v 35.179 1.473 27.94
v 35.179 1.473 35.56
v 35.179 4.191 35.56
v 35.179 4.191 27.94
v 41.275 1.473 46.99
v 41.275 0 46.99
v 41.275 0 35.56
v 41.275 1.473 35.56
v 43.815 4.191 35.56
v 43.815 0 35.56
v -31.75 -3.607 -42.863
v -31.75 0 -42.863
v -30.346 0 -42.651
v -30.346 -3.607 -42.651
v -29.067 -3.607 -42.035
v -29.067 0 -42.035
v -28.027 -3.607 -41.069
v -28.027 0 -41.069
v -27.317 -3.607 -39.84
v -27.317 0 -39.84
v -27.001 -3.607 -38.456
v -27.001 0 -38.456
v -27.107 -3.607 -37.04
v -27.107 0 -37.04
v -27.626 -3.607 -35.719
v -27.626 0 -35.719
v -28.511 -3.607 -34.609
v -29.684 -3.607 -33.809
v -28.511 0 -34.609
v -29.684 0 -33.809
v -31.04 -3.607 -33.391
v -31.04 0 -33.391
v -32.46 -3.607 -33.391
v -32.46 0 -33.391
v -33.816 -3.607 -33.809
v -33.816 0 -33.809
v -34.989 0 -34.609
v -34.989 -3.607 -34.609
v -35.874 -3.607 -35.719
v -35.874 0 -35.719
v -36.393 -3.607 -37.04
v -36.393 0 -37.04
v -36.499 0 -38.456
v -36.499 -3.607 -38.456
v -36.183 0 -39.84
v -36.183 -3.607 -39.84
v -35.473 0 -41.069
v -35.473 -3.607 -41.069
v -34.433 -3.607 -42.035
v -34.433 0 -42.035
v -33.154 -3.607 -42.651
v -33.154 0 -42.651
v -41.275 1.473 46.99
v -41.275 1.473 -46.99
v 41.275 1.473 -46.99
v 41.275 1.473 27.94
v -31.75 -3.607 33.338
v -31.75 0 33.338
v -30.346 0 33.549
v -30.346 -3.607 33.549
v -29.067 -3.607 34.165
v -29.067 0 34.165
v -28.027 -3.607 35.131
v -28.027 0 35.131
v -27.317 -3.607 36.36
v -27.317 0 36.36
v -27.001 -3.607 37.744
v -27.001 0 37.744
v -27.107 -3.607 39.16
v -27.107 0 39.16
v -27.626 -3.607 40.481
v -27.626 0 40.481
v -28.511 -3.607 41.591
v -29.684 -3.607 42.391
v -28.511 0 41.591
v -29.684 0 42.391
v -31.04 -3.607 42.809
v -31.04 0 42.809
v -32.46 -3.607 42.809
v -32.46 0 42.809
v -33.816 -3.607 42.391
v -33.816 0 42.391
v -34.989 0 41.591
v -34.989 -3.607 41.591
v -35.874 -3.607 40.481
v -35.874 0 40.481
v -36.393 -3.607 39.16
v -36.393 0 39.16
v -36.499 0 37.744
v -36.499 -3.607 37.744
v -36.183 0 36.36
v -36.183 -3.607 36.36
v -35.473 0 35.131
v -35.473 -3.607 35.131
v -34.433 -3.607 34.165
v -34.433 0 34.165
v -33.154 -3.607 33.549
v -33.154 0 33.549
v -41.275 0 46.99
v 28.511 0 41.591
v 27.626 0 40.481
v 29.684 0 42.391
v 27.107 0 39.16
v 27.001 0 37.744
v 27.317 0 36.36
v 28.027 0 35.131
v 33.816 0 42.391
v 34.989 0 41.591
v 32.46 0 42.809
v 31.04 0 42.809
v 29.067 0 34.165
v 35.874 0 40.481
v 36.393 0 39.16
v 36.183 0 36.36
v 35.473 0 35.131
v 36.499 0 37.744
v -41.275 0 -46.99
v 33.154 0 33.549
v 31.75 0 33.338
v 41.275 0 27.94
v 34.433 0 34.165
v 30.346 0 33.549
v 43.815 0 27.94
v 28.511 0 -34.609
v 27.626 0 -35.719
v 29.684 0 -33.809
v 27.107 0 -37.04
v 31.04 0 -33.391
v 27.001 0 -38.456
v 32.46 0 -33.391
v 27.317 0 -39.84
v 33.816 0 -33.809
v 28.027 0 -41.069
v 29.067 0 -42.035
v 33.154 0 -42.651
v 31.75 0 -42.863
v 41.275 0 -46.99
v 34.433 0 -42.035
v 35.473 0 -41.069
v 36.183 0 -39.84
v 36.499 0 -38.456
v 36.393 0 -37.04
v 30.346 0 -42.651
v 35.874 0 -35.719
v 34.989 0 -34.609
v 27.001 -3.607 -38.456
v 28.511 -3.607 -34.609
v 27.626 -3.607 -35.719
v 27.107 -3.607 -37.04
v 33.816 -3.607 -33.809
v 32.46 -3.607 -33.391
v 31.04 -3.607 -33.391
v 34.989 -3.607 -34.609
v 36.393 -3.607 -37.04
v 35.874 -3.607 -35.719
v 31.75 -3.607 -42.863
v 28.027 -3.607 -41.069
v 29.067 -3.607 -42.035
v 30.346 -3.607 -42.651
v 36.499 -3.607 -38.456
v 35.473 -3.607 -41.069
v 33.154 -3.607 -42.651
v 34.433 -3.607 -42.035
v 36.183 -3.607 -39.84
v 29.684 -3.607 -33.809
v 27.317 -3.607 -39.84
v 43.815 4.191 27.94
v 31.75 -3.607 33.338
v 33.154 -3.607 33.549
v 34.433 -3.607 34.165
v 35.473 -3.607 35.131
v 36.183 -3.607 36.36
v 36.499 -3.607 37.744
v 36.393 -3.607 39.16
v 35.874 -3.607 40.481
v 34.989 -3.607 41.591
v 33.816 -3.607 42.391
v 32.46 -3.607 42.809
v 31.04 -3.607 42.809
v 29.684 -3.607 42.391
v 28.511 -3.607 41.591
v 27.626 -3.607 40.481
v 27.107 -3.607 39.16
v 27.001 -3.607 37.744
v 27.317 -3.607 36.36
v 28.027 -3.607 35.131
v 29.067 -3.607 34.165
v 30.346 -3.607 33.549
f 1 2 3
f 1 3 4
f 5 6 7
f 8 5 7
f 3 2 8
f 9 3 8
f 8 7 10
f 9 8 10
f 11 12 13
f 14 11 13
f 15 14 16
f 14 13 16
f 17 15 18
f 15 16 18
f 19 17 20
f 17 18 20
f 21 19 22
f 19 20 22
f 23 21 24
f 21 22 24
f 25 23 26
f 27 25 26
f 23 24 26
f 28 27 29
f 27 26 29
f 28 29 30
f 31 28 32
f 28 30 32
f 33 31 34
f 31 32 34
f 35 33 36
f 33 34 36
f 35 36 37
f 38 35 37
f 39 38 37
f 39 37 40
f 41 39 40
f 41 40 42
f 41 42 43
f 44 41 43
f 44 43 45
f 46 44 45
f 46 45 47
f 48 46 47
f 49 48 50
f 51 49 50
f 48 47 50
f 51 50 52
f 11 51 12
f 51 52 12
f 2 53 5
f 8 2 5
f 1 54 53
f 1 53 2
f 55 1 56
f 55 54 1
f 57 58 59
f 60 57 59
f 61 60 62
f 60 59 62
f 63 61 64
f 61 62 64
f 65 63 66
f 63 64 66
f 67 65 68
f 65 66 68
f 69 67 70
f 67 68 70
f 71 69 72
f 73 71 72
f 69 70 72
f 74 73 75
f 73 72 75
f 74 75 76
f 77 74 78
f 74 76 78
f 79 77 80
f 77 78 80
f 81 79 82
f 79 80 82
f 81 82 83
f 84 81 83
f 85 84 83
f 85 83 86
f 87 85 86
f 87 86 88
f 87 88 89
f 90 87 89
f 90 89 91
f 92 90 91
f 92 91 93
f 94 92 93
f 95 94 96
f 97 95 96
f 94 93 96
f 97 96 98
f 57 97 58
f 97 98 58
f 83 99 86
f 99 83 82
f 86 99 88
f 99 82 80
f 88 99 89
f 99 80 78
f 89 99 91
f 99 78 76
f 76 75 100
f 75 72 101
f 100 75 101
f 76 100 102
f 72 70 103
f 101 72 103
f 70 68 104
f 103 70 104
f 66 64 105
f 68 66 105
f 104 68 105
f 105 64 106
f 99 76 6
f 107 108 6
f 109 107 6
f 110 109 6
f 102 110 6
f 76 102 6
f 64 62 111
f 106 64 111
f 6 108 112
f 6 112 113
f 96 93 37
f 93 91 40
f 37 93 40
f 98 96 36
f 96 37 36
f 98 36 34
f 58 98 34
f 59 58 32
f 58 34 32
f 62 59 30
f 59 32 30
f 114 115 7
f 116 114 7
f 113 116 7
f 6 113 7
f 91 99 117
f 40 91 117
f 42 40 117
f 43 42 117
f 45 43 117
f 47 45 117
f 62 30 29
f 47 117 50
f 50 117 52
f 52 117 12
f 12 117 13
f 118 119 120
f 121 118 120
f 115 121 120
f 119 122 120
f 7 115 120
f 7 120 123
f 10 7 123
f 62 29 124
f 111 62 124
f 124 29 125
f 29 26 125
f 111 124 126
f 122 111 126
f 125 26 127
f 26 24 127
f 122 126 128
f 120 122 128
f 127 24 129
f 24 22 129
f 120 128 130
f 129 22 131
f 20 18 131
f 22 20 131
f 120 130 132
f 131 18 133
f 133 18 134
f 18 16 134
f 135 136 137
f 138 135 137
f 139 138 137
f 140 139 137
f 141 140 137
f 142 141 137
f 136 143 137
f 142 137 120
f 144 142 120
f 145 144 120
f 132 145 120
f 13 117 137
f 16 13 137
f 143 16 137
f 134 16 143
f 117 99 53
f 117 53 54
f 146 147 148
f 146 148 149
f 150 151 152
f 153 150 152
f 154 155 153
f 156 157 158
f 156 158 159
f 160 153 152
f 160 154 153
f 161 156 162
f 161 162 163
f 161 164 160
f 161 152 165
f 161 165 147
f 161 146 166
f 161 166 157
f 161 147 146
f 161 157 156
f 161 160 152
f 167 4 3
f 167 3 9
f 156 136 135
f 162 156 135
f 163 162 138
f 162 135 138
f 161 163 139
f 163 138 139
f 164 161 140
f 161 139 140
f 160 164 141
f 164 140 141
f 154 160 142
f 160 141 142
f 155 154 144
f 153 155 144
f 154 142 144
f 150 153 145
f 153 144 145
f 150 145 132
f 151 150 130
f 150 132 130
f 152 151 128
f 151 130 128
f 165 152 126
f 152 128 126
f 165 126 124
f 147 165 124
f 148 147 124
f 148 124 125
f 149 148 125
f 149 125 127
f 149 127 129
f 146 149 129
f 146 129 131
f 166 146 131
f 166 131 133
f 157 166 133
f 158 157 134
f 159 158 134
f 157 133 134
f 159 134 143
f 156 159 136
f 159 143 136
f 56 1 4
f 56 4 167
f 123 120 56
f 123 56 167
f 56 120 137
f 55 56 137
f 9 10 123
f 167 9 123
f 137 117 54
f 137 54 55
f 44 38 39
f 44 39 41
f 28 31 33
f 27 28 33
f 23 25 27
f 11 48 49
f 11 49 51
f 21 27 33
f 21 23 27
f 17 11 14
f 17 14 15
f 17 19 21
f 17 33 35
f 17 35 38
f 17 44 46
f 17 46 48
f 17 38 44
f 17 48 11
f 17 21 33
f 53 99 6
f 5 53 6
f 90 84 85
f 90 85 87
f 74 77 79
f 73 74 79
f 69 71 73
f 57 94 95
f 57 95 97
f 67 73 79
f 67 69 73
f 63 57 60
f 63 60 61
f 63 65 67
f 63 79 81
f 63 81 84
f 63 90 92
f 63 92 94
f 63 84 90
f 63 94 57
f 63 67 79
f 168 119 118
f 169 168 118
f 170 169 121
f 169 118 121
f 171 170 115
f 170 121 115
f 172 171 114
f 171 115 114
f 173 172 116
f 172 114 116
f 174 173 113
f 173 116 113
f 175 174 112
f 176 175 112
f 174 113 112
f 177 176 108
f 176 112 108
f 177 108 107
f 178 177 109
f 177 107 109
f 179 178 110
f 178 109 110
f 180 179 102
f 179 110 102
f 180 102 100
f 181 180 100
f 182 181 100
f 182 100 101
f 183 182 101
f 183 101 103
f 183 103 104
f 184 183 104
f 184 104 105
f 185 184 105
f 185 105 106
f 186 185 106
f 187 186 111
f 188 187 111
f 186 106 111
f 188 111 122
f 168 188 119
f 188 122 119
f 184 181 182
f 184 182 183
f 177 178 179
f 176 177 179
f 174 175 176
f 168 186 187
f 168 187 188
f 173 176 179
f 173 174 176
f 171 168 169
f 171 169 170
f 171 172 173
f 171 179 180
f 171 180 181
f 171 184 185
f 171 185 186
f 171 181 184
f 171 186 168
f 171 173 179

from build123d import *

# Parameters (mm, degrees)
SKETCH1_W           = 82.55
SKETCH1_H           = 93.98
BOSS_EXTRUDE1_DEPTH = 1.4732
SKETCH2_W           = 8.636
SKETCH2_H           = 7.62
BOSS_EXTRUDE2_DEPTH = 4.191
SKETCH3_R           = 4.7625
BOSS_EXTRUDE3_DEPTH = 3.6068


with BuildPart() as part:
    # Sketch1 → Boss-Extrude1 (new body)
    with BuildSketch(Plane(origin=(0, 0, 0), x_dir=(1, 0, 0), z_dir=(0, 1, 0))):
        Rectangle(SKETCH1_W, SKETCH1_H)
    extrude(amount=BOSS_EXTRUDE1_DEPTH)

    # Sketch2 → Boss-Extrude2 (add)
    with BuildSketch(Plane(origin=(0, 0, 0), x_dir=(1, 0, 0), z_dir=(0, 1, 0))):
        with Locations((39.497, -31.75)):
            Rectangle(SKETCH2_W, SKETCH2_H)
    extrude(amount=BOSS_EXTRUDE2_DEPTH)

    # Sketch3 → Boss-Extrude3 (add)
    with BuildSketch(Plane.XZ):
        with Locations(Location((-31.75, 38.1, 0), (0, 0, 270))):
            Circle(SKETCH3_R)
        with Locations(Location((31.75, 38.1, 0), (0, 0, 270))):
            Circle(SKETCH3_R)
        with Locations(Location((-31.75, -38.1, 0), (0, 0, 270))):
            Circle(SKETCH3_R)
        with Locations(Location((31.75, -38.1, 0), (0, 0, 270))):
            Circle(SKETCH3_R)
    extrude(amount=BOSS_EXTRUDE3_DEPTH)


solid = part.part
